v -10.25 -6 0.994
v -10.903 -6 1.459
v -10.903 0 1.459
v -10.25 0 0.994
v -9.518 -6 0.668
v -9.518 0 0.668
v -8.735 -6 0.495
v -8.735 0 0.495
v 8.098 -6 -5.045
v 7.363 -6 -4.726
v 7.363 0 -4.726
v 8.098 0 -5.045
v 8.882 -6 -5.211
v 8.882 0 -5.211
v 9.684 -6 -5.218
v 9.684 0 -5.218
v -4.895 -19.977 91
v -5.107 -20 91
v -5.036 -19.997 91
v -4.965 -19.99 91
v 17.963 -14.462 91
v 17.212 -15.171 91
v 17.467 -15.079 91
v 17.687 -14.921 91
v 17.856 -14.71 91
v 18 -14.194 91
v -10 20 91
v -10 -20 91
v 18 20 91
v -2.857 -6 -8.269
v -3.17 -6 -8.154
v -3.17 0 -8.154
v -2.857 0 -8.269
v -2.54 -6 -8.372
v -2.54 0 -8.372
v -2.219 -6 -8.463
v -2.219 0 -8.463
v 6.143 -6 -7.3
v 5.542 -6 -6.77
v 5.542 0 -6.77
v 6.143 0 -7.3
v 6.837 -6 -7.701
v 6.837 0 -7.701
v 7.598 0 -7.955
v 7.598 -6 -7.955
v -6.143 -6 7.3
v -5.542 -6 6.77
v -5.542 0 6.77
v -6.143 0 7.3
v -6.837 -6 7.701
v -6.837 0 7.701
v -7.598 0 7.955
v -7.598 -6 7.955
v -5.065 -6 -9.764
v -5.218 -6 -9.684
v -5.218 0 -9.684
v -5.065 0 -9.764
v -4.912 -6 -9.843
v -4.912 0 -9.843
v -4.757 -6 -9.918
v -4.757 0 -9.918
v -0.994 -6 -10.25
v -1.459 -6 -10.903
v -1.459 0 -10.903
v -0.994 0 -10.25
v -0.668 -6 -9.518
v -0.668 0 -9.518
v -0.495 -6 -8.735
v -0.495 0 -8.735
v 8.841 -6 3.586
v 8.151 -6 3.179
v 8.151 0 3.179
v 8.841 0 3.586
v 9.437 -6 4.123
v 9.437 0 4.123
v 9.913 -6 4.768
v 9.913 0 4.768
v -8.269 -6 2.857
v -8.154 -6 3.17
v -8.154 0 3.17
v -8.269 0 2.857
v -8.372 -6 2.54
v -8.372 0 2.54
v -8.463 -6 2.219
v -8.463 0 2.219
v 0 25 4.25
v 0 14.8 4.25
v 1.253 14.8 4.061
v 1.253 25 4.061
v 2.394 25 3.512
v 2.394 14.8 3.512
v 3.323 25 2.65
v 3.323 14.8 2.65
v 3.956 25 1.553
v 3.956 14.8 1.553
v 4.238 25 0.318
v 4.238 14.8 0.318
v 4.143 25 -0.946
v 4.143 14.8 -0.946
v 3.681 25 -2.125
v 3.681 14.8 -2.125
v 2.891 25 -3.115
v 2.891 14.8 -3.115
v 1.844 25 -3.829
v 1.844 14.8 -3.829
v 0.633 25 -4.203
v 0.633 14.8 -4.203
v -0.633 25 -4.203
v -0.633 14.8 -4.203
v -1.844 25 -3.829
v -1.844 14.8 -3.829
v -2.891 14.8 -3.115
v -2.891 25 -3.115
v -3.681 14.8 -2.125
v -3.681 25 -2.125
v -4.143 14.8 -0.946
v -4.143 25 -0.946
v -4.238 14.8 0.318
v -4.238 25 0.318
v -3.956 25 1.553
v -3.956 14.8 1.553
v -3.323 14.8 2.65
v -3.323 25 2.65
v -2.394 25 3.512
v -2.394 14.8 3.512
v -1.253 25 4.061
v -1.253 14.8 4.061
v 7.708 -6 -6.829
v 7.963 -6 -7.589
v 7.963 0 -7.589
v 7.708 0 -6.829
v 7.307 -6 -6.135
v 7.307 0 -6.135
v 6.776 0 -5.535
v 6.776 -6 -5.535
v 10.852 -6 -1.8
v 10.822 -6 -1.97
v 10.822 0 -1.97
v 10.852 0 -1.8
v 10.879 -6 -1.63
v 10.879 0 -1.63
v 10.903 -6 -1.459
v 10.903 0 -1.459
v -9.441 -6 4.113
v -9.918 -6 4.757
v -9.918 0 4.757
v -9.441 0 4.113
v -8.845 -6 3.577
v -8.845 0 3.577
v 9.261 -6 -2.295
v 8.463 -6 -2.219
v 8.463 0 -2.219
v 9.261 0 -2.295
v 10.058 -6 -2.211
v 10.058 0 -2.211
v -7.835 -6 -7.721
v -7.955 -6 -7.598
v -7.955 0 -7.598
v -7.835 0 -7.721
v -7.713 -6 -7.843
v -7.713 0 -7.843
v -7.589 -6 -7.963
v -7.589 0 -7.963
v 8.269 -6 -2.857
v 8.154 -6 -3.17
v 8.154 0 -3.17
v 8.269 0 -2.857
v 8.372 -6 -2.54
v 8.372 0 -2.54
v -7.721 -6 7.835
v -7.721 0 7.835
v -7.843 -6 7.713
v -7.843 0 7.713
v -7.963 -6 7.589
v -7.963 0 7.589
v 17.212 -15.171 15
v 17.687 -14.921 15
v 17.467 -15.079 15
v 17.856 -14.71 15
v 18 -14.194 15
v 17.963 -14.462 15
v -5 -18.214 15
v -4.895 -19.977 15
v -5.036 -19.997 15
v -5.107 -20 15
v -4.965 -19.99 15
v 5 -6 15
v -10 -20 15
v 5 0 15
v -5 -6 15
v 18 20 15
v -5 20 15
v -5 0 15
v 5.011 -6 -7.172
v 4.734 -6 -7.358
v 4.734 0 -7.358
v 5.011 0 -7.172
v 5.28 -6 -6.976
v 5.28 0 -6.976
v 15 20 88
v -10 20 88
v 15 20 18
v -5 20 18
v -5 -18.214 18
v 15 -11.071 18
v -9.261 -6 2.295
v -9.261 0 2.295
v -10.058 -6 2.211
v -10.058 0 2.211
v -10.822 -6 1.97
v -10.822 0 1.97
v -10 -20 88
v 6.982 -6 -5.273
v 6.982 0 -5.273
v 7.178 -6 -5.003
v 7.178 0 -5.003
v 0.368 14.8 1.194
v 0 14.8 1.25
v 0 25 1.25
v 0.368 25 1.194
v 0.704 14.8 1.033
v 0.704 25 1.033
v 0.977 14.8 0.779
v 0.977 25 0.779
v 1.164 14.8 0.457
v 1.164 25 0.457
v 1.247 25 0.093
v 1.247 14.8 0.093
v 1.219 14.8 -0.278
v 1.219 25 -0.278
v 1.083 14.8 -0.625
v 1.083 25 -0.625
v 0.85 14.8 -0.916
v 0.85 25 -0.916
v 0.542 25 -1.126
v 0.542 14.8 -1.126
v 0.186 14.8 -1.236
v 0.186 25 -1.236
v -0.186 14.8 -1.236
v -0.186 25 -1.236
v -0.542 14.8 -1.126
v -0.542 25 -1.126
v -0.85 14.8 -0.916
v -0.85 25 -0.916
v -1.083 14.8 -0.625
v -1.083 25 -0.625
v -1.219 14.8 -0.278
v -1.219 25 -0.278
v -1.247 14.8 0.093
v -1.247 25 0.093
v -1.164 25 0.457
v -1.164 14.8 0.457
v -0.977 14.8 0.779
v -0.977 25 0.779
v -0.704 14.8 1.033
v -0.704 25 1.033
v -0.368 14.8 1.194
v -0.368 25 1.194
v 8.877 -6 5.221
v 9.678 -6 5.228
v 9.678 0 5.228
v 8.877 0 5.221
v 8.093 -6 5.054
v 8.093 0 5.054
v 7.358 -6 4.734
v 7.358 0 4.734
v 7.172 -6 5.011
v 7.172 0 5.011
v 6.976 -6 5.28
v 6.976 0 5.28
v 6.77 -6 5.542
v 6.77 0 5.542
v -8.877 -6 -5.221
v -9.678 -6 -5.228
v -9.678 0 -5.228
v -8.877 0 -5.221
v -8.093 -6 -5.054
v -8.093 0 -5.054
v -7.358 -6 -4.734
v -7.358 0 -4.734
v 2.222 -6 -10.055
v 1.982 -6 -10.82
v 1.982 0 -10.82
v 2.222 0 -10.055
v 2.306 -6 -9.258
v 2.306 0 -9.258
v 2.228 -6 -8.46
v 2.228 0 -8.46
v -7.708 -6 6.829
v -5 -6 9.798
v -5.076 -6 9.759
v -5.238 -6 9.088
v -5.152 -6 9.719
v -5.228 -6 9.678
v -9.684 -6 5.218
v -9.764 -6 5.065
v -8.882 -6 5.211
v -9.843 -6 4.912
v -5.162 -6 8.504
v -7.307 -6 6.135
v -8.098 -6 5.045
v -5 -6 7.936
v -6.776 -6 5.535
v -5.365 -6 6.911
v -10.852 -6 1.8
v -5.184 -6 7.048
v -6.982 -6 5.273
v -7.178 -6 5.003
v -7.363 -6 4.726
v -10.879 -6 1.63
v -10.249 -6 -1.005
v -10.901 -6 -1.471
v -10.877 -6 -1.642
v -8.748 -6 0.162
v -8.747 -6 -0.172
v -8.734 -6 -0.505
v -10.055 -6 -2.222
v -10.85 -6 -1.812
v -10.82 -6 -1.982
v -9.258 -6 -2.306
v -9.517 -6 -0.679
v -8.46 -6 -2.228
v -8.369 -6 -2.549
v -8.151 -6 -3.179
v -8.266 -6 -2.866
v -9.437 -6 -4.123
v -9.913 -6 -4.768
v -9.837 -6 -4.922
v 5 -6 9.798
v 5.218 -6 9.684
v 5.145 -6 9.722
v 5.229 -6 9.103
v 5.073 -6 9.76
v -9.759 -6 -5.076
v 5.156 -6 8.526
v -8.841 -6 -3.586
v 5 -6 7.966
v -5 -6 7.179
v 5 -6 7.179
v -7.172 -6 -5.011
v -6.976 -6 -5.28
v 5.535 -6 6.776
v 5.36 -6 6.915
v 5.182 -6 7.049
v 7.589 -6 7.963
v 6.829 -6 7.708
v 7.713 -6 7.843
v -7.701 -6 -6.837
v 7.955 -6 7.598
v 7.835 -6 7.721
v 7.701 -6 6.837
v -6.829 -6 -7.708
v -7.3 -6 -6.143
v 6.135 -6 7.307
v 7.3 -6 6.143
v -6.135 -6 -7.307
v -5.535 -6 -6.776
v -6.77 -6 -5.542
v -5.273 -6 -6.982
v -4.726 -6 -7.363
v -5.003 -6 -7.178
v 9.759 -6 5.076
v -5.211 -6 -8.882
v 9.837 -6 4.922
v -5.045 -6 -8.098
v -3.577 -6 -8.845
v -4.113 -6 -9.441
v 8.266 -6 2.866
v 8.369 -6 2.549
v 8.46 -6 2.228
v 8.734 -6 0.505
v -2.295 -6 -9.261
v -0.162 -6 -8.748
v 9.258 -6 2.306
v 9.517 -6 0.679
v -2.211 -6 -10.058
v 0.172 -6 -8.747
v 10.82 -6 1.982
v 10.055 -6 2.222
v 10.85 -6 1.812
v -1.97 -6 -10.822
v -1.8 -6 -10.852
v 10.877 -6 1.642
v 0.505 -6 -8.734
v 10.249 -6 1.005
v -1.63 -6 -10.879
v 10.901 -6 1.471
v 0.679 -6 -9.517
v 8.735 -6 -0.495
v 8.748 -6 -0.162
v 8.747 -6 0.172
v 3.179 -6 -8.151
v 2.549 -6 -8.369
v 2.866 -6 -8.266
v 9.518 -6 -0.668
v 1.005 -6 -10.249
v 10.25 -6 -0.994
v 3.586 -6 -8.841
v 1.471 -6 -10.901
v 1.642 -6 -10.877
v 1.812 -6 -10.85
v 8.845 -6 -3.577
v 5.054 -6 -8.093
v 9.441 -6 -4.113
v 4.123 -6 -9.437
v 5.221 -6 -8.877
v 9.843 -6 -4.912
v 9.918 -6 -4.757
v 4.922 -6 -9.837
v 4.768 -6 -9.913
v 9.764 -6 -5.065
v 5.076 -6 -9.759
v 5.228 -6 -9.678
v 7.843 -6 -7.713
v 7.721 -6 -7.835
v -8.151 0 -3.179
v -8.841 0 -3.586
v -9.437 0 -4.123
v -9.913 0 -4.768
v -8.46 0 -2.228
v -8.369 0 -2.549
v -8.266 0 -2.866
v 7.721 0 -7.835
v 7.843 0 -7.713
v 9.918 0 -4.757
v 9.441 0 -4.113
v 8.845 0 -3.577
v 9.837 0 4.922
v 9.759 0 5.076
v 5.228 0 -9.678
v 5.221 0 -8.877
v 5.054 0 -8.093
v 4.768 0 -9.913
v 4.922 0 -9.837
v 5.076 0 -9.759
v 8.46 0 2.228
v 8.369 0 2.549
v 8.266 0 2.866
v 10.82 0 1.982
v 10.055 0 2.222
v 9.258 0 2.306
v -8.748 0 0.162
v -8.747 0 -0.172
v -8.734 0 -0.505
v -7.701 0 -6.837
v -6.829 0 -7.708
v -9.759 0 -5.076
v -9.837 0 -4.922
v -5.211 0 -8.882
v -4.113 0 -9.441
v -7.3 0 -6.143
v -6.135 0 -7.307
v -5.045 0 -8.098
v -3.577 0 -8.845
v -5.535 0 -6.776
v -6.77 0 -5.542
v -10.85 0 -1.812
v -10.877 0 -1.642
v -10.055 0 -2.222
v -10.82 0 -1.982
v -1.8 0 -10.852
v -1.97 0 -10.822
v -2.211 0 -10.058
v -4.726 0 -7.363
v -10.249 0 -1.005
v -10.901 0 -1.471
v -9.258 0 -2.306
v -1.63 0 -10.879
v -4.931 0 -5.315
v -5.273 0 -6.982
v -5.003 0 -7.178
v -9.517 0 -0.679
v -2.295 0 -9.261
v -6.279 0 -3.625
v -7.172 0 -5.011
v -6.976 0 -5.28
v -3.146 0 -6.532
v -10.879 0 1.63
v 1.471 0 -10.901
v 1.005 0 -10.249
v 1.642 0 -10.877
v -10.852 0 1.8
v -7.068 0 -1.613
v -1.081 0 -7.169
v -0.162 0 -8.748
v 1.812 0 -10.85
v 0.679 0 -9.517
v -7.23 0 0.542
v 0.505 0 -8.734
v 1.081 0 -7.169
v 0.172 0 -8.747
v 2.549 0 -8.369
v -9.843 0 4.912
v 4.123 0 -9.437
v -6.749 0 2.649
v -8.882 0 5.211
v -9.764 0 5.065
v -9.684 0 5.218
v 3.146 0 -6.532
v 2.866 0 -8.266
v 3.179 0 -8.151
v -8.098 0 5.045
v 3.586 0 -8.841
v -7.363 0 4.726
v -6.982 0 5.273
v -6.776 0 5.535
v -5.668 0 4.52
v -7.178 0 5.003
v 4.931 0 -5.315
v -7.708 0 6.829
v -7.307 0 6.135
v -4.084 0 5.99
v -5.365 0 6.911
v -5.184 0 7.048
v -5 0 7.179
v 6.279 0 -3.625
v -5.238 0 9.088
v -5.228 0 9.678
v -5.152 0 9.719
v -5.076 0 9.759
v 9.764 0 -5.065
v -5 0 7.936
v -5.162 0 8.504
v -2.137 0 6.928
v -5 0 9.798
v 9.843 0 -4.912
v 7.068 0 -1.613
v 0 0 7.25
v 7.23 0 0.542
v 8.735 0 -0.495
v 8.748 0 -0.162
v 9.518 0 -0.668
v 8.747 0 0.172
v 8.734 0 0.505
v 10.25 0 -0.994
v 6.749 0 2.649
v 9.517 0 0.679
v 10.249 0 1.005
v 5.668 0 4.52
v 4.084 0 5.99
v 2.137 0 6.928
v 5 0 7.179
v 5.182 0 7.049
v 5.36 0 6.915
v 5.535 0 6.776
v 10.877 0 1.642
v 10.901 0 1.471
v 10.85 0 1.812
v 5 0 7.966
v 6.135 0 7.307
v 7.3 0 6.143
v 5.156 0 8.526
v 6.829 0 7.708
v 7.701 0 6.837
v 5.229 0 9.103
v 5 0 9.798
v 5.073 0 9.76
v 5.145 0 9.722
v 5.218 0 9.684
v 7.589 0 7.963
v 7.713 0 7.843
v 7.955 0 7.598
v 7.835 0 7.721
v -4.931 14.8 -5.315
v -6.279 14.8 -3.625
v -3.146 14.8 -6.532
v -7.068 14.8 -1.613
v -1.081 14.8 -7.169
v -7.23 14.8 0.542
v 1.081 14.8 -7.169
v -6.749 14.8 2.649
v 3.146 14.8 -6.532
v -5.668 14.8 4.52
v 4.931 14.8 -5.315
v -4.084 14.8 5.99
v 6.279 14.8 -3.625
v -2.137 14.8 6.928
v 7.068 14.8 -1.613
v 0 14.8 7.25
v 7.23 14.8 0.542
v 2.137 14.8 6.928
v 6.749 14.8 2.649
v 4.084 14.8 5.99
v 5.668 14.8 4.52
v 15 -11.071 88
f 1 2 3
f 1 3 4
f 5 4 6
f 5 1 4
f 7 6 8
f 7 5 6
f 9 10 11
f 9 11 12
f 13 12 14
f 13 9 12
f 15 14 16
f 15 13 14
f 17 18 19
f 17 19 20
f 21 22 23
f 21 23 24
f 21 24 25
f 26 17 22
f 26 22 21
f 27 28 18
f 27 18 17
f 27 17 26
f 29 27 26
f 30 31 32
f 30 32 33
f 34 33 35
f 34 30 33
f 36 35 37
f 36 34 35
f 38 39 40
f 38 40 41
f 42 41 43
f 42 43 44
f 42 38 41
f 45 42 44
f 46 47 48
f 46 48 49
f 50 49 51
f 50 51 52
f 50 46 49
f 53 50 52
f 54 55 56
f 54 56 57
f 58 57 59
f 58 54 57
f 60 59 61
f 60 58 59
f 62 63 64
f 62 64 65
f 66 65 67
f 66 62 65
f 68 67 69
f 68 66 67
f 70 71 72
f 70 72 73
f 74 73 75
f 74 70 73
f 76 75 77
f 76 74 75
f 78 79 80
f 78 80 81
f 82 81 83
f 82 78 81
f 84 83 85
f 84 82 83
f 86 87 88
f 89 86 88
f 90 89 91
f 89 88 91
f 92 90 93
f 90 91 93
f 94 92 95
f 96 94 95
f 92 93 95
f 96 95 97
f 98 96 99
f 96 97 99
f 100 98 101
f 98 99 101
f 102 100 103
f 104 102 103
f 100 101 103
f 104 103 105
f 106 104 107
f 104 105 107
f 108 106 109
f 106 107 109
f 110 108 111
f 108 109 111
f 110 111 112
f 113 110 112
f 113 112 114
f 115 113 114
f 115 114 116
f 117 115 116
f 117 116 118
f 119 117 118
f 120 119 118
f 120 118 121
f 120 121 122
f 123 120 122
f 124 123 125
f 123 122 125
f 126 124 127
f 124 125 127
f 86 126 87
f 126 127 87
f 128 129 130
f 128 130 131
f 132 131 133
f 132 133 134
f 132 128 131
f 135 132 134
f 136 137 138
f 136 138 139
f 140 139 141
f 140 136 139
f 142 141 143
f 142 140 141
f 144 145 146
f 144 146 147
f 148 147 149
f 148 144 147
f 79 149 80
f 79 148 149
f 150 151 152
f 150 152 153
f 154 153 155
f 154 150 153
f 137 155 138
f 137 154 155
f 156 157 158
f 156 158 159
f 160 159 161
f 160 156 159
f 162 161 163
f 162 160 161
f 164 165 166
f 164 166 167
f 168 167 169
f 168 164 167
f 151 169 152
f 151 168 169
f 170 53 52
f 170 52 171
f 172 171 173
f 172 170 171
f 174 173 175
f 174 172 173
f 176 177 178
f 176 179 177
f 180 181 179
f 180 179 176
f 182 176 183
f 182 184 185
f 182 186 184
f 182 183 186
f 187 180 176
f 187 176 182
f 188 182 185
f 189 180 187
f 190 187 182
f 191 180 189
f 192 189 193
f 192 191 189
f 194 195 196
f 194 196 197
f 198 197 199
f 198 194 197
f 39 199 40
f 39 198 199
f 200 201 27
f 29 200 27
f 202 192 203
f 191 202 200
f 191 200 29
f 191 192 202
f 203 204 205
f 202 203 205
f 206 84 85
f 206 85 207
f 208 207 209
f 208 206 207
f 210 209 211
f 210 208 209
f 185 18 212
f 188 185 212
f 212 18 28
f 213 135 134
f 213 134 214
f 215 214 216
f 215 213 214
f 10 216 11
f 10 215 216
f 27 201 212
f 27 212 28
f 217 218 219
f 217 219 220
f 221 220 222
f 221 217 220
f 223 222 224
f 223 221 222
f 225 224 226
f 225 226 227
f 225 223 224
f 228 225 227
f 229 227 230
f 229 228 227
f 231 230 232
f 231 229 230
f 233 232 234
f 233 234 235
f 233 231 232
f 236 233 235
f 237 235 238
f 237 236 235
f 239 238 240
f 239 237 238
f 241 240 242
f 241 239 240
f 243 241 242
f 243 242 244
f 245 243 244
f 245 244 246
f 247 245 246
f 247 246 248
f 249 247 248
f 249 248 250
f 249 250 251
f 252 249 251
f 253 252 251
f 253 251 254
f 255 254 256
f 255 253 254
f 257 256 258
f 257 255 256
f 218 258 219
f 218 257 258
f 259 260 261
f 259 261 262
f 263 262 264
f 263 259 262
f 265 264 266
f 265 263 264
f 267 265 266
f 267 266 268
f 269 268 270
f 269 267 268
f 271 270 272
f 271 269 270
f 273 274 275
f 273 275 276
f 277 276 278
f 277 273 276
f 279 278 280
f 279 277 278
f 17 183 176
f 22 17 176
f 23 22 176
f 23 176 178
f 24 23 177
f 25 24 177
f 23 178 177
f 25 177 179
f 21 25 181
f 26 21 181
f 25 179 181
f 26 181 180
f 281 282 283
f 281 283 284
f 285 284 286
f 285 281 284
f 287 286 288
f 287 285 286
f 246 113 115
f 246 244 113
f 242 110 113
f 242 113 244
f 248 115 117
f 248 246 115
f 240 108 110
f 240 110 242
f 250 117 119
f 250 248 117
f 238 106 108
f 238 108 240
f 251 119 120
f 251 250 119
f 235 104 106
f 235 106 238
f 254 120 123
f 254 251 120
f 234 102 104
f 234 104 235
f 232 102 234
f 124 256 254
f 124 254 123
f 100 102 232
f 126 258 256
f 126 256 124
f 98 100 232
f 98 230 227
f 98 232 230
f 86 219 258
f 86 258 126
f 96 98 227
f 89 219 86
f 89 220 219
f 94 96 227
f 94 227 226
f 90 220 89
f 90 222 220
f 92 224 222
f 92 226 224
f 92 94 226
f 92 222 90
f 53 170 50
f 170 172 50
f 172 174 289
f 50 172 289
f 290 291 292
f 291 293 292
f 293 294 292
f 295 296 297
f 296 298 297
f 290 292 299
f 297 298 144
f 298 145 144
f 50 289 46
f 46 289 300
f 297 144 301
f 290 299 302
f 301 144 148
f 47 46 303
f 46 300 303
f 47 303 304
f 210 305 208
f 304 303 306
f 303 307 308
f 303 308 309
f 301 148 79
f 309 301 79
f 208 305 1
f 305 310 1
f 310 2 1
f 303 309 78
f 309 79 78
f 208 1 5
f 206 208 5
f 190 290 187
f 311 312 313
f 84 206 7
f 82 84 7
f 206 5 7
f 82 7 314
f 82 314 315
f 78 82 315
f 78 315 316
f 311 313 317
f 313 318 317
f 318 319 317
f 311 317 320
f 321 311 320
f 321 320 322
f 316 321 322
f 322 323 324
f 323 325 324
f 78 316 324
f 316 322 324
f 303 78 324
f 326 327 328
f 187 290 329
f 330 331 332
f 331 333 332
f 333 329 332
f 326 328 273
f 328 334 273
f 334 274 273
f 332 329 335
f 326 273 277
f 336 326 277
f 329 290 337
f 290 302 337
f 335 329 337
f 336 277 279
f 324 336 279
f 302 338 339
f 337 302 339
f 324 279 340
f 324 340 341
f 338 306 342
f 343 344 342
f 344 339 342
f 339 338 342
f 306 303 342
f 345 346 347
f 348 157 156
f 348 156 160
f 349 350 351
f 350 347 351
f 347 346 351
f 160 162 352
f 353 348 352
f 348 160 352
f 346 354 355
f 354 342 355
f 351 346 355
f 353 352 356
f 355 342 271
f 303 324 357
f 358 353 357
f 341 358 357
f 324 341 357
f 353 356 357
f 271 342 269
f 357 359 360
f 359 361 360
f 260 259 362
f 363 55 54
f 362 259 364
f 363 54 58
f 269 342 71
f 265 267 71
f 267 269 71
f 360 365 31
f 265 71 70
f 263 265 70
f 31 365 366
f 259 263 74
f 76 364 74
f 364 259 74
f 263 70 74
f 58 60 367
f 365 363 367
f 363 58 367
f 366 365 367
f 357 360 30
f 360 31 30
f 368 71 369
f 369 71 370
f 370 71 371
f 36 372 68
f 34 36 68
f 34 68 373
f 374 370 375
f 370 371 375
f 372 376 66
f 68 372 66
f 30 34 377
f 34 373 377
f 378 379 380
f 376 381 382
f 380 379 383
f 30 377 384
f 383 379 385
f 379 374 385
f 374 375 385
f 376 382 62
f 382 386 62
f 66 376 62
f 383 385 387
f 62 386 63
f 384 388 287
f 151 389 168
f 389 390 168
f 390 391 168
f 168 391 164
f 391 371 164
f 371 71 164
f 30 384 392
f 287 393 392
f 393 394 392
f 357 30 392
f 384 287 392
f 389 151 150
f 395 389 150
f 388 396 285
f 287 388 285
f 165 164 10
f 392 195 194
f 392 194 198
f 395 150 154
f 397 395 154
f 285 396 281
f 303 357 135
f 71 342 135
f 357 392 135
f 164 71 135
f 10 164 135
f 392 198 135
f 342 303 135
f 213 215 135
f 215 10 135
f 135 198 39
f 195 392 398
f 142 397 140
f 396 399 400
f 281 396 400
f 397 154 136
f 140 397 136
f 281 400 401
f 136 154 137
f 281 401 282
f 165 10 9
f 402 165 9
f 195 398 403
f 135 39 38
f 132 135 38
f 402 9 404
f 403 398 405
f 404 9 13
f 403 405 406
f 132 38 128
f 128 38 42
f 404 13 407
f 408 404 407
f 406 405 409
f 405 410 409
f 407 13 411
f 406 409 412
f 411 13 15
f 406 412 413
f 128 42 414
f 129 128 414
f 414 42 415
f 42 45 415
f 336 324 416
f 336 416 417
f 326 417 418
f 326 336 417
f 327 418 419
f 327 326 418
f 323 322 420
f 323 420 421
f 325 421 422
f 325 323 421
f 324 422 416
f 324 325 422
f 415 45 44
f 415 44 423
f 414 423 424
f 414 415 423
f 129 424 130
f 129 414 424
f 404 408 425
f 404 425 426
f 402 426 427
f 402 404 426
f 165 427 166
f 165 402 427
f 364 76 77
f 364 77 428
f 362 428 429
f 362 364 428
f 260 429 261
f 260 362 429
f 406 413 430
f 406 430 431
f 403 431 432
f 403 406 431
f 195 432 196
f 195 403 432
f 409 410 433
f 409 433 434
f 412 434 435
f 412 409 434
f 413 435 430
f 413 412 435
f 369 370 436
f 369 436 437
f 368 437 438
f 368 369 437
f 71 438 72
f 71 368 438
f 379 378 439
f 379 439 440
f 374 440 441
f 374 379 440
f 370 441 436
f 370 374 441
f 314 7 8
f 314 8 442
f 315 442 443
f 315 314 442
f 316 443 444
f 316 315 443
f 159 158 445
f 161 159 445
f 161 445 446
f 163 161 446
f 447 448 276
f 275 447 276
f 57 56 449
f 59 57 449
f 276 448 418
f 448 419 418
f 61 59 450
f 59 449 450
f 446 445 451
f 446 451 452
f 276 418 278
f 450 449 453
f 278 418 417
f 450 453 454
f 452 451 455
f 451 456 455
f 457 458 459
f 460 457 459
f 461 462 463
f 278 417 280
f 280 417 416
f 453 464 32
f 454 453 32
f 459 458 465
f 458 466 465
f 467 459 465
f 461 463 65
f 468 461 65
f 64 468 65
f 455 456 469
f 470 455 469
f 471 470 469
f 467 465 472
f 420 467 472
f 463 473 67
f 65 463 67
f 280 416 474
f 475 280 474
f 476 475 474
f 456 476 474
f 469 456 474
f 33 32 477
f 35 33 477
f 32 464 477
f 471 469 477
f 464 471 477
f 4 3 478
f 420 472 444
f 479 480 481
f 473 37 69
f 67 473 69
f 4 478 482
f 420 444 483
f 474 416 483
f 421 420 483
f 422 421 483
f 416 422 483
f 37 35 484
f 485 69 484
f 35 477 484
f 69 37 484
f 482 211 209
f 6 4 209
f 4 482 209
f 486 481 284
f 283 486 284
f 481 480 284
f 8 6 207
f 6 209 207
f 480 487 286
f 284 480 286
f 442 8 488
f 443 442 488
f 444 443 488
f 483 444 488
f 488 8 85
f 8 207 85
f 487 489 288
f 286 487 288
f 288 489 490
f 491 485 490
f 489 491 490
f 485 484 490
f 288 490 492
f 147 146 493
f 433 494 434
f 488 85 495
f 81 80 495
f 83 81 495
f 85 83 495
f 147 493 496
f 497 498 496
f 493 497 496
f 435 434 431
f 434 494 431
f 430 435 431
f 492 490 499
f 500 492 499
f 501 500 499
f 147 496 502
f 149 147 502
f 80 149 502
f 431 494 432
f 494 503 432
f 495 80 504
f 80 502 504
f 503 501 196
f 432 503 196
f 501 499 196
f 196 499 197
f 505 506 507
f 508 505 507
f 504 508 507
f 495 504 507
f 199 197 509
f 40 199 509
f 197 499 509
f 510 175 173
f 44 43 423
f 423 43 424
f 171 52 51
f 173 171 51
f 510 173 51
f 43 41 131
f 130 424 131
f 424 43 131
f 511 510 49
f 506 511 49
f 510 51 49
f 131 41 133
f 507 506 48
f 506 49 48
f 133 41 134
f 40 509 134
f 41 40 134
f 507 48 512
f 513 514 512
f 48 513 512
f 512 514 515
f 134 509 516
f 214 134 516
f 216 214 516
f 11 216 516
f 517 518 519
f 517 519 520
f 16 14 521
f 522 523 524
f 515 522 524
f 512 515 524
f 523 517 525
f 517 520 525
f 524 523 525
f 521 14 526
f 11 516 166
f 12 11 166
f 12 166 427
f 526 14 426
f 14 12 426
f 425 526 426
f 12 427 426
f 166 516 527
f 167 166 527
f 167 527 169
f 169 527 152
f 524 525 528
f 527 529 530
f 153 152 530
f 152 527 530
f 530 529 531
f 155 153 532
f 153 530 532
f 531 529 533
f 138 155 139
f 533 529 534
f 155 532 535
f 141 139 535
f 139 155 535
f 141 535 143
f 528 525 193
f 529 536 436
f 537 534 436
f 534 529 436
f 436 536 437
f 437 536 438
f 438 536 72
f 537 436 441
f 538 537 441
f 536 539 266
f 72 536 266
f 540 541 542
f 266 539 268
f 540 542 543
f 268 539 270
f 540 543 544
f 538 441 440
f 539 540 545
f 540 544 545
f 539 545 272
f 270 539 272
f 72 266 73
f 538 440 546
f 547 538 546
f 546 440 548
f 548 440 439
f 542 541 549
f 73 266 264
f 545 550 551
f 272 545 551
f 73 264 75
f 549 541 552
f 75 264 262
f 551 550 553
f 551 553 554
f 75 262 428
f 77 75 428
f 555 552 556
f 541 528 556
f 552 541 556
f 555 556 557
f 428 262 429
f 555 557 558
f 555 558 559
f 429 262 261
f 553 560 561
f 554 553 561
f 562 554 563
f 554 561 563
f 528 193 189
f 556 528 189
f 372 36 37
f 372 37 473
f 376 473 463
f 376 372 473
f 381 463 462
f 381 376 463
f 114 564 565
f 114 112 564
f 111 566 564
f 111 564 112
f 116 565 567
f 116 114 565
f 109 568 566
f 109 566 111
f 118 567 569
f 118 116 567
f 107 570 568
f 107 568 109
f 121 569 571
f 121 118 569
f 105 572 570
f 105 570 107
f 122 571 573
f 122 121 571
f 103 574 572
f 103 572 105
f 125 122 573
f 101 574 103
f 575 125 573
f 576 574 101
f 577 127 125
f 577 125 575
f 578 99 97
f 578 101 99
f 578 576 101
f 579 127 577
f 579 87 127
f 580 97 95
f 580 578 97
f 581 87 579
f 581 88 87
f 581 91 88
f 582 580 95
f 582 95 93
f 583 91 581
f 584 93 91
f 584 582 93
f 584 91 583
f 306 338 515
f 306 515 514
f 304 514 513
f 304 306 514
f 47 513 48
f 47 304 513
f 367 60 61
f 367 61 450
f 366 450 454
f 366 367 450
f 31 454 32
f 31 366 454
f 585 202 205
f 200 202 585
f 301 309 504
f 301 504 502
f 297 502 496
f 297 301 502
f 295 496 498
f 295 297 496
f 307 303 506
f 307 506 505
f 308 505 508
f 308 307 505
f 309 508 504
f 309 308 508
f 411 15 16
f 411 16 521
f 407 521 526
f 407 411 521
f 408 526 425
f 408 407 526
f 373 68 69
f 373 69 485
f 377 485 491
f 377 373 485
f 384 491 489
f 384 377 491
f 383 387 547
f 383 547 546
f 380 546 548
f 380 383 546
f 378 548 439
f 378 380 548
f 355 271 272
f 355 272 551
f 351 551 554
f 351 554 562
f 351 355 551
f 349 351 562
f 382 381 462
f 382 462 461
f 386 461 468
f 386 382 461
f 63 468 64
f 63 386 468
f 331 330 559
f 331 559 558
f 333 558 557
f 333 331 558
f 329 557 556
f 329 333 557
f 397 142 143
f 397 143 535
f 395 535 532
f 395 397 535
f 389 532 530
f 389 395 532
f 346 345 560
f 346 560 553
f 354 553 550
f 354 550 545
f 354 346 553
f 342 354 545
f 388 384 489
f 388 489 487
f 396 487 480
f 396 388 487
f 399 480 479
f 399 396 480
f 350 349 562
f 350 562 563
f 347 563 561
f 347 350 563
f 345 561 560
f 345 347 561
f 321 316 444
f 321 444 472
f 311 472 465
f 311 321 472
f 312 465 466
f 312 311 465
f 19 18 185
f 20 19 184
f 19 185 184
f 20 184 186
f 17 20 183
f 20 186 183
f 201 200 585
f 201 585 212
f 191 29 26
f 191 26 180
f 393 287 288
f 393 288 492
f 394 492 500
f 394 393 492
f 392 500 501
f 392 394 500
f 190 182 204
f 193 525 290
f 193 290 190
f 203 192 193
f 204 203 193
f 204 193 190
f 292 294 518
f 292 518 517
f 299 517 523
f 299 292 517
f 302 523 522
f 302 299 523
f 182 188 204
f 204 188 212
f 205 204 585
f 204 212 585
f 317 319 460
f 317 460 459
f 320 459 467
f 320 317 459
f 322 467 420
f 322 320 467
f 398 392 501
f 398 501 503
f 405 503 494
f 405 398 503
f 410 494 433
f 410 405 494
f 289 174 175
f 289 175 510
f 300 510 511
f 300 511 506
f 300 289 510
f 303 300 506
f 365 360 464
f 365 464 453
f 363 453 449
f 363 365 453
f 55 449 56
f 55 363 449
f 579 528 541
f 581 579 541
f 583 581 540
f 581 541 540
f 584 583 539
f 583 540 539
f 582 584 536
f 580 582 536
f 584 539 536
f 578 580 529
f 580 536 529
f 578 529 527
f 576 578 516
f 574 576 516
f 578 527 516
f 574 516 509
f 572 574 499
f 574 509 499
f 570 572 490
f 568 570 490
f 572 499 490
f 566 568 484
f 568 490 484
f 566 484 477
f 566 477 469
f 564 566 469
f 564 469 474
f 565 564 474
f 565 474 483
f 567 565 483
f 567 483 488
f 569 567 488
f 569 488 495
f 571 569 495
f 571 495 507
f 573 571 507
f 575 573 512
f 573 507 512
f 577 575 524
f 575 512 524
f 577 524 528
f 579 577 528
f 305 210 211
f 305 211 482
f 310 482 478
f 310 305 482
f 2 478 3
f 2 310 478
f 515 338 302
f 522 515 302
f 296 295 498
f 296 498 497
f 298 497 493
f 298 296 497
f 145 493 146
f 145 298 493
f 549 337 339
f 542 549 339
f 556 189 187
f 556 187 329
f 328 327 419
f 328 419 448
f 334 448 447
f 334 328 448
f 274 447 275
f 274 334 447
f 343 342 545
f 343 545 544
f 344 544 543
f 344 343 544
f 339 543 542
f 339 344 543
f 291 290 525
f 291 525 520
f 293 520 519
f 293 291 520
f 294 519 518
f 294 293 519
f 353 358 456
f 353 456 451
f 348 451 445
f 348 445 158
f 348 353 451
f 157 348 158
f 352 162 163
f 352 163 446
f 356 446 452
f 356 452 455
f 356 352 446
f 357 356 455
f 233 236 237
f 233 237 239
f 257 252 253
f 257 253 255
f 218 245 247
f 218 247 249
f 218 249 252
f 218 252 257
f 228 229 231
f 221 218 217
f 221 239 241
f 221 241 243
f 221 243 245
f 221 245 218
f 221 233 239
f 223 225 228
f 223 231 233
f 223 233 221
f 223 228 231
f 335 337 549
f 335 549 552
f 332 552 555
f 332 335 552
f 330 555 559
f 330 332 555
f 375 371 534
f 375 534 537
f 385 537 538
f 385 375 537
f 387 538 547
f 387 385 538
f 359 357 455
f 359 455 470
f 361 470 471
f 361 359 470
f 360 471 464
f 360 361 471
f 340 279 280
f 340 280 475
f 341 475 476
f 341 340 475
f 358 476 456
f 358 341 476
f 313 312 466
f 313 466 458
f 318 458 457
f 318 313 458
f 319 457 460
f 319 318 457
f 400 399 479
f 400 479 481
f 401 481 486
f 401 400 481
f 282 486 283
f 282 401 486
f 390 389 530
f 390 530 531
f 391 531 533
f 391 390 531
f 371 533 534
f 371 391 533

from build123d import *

# Parameters (mm, degrees)
EXTRUDE_1_DEPTH     = 6
EXTRUDE_2_DEPTH     = 20
EXTRUDE_4_DEPTH     = 6
SKETCH_5_R          = 7.25
EXTRUDE_5_DEPTH     = 14.8
SKETCH_6_R          = 4.25
SKETCH_6_R_2        = 1.25
EXTRUDE_6_DEPTH     = 10.2
EXTRUDE_7_DEPTH     = 76
CUT_EXTRUDE_1_DEPTH = 76


with BuildPart() as part:
    # 草图1 → 凸台-拉伸1 (new body)
    with BuildSketch(Plane(origin=(0, 0, 0), x_dir=(1, 0, 0), z_dir=(0, 1, 0))):
        with BuildLine():
            Line((-5, 0), (-5, -18))
            Line((-5, -18), (15, -18))
            Line((15, -18), (15, -88))
            Line((15, -88), (-10, -88))
            Line((-10, -88), (-10, -91))
            Line((-10, -91), (18, -91))
            Line((18, -91), (18, -15))
            Line((18, -15), (5, -15))
            Line((5, -15), (5, 0))
            ThreePointArc((5, 0), (0, 5), (-5, 0))
        make_face()
    extrude(amount=-EXTRUDE_1_DEPTH)

    # 草图2 → 凸台-拉伸2 (add, symmetric)
    with BuildSketch(Plane(origin=(0, 0, 0), x_dir=(1, 0, 0), z_dir=(0, 1, 0))):
        Polygon((-5, -18), (15, -18), (15, -88), (-10, -88), (-10, -91), (18, -91), (18, -15), (-5, -15), align=None)
    extrude(amount=EXTRUDE_2_DEPTH, both=True)

    # 草图4 → 凸台-拉伸4 (add)
    with BuildSketch(Plane.XZ.offset(6)):
        with BuildLine():
            ThreePointArc((-0.504732798, 8.734428762), (-0.823506466, 9.891100464), (-1.470958285, 10.901205517))
            ThreePointArc((-1.470958285, 10.901205517), (-1.726760313, 10.86362273), (-1.981608382, 10.820038273))
            ThreePointArc((-1.981608382, 10.820038273), (-2.283953757, 9.65896405), (-2.228374617, 8.460457882))
            ThreePointArc((-2.228374617, 8.460457882), (-2.708170263, 8.319303747), (-3.17911634, 8.150964378))
            ThreePointArc((-3.17911634, 8.150964378), (-3.839719327, 9.152518056), (-4.767622226, 9.913111434))
            ThreePointArc((-4.767622226, 9.913111434), (-4.999290692, 9.798320906), (-5.228197271, 9.678117239))
            ThreePointArc((-5.228197271, 9.678117239), (-5.156953143, 8.480440175), (-4.733735466, 7.357767973))
            ThreePointArc((-4.733735466, 7.357767973), (-5.146429214, 7.075257405), (-5.542305825, 6.76962681))
            ThreePointArc((-5.542305825, 6.76962681), (-6.480073708, 7.518023412), (-7.597598086, 7.954652936))
            ThreePointArc((-7.597598086, 7.954652936), (-7.782455665, 7.773891163), (-7.963013783, 7.588834659))
            ThreePointArc((-7.963013783, 7.588834659), (-7.525154025, 6.471791729), (-6.775725305, 5.53484847))
            ThreePointArc((-6.775725305, 5.53484847), (-7.080919818, 5.138635571), (-7.3629758, 4.725631002))
            ThreePointArc((-7.3629758, 4.725631002), (-8.486113324, 5.147612255), (-9.683868109, 5.217537585))
            ThreePointArc((-9.683868109, 5.217537585), (-9.803819655, 4.988498789), (-9.918355025, 4.756704069))
            ThreePointArc((-9.918355025, 4.756704069), (-9.1567404, 3.829639217), (-8.154459943, 3.170139435))
            ThreePointArc((-8.154459943, 3.170139435), (-8.322280653, 2.699008286), (-8.462906403, 2.219057507))
            ThreePointArc((-8.462906403, 2.219057507), (-9.661473042, 2.273316945), (-10.82221365, 1.969693302))
            ThreePointArc((-10.82221365, 1.969693302), (-10.86551747, 1.714797397), (-10.902818572, 1.458954141))
            ThreePointArc((-10.902818572, 1.458954141), (-9.892001226, 0.812614936), (-8.734979226, 0.495115065))
            ThreePointArc((-8.734979226, 0.495115065), (-8.748998674, -0.004816736), (-8.734428762, -0.504732798))
            ThreePointArc((-8.734428762, -0.504732798), (-9.891100464, -0.823506466), (-10.901205517, -1.470958285))
            ThreePointArc((-10.901205517, -1.470958285), (-10.86362273, -1.726760313), (-10.820038273, -1.981608382))
            ThreePointArc((-10.820038273, -1.981608382), (-9.65896405, -2.283953757), (-8.460457882, -2.228374617))
            ThreePointArc((-8.460457882, -2.228374617), (-8.319303747, -2.708170263), (-8.150964378, -3.17911634))
            ThreePointArc((-8.150964378, -3.17911634), (-9.152518056, -3.839719327), (-9.913111434, -4.767622226))
            ThreePointArc((-9.913111434, -4.767622226), (-9.798320906, -4.999290692), (-9.678117239, -5.228197271))
            ThreePointArc((-9.678117239, -5.228197271), (-8.480440175, -5.156953143), (-7.357767973, -4.733735466))
            ThreePointArc((-7.357767973, -4.733735466), (-7.075257405, -5.146429214), (-6.76962681, -5.542305825))
            ThreePointArc((-6.76962681, -5.542305825), (-7.518023412, -6.480073708), (-7.954652936, -7.597598086))
            ThreePointArc((-7.954652936, -7.597598086), (-7.773891163, -7.782455665), (-7.588834659, -7.963013783))
            ThreePointArc((-7.588834659, -7.963013783), (-6.471791729, -7.525154025), (-5.53484847, -6.775725305))
            ThreePointArc((-5.53484847, -6.775725305), (-5.138635571, -7.080919818), (-4.725631002, -7.3629758))
            ThreePointArc((-4.725631002, -7.3629758), (-5.147612255, -8.486113324), (-5.217537585, -9.683868109))
            ThreePointArc((-5.217537585, -9.683868109), (-4.988498789, -9.803819655), (-4.756704069, -9.918355025))
            ThreePointArc((-4.756704069, -9.918355025), (-3.829639217, -9.1567404), (-3.170139435, -8.154459943))
            ThreePointArc((-3.170139435, -8.154459943), (-2.699008286, -8.322280653), (-2.219057507, -8.462906403))
            ThreePointArc((-2.219057507, -8.462906403), (-2.273316945, -9.661473042), (-1.969693302, -10.82221365))
            ThreePointArc((-1.969693302, -10.82221365), (-1.714797397, -10.86551747), (-1.458954141, -10.902818572))
            ThreePointArc((-1.458954141, -10.902818572), (-0.812614936, -9.892001226), (-0.495115065, -8.734979226))
            ThreePointArc((-0.495115065, -8.734979226), (0.004816736, -8.748998674), (0.504732798, -8.734428762))
            ThreePointArc((0.504732798, -8.734428762), (0.823506466, -9.891100464), (1.470958285, -10.901205517))
            ThreePointArc((1.470958285, -10.901205517), (1.726760313, -10.86362273), (1.981608382, -10.820038273))
            ThreePointArc((1.981608382, -10.820038273), (2.283953757, -9.65896405), (2.228374617, -8.460457882))
            ThreePointArc((2.228374617, -8.460457882), (2.708170263, -8.319303747), (3.17911634, -8.150964378))
            ThreePointArc((3.17911634, -8.150964378), (3.839719327, -9.152518056), (4.767622226, -9.913111434))
            ThreePointArc((4.767622226, -9.913111434), (4.999290692, -9.798320906), (5.228197271, -9.678117239))
            ThreePointArc((5.228197271, -9.678117239), (5.156953143, -8.480440175), (4.733735466, -7.357767973))
            ThreePointArc((4.733735466, -7.357767973), (5.146429214, -7.075257405), (5.542305825, -6.76962681))
            ThreePointArc((5.542305825, -6.76962681), (6.480073708, -7.518023412), (7.597598086, -7.954652936))
            ThreePointArc((7.597598086, -7.954652936), (7.782455665, -7.773891163), (7.963013783, -7.588834659))
            ThreePointArc((7.963013783, -7.588834659), (7.525154025, -6.471791729), (6.775725305, -5.53484847))
            ThreePointArc((6.775725305, -5.53484847), (7.080919818, -5.138635571), (7.3629758, -4.725631002))
            ThreePointArc((7.3629758, -4.725631002), (8.486113324, -5.147612255), (9.683868109, -5.217537585))
            ThreePointArc((9.683868109, -5.217537585), (9.803819655, -4.988498789), (9.918355025, -4.756704069))
            ThreePointArc((9.918355025, -4.756704069), (9.1567404, -3.829639217), (8.154459943, -3.170139435))
            ThreePointArc((8.154459943, -3.170139435), (8.322280653, -2.699008286), (8.462906403, -2.219057507))
            ThreePointArc((8.462906403, -2.219057507), (9.661473042, -2.273316945), (10.82221365, -1.969693302))
            ThreePointArc((10.82221365, -1.969693302), (10.86551747, -1.714797397), (10.902818572, -1.458954141))
            ThreePointArc((10.902818572, -1.458954141), (9.892001226, -0.812614936), (8.734979226, -0.495115065))
            ThreePointArc((8.734979226, -0.495115065), (8.748998674, 0.004816736), (8.734428762, 0.504732798))
            ThreePointArc((8.734428762, 0.504732798), (9.891100464, 0.823506466), (10.901205517, 1.470958285))
            ThreePointArc((10.901205517, 1.470958285), (10.86362273, 1.726760313), (10.820038273, 1.981608382))
            ThreePointArc((10.820038273, 1.981608382), (9.65896405, 2.283953757), (8.460457882, 2.228374617))
            ThreePointArc((8.460457882, 2.228374617), (8.319303747, 2.708170263), (8.150964378, 3.17911634))
            ThreePointArc((8.150964378, 3.17911634), (9.152518056, 3.839719327), (9.913111434, 4.767622226))
            ThreePointArc((9.913111434, 4.767622226), (9.798320906, 4.999290692), (9.678117239, 5.228197271))
            ThreePointArc((9.678117239, 5.228197271), (8.480440175, 5.156953143), (7.357767973, 4.733735466))
            ThreePointArc((7.357767973, 4.733735466), (7.075257405, 5.146429214), (6.76962681, 5.542305825))
            ThreePointArc((6.76962681, 5.542305825), (7.518023412, 6.480073708), (7.954652936, 7.597598086))
            ThreePointArc((7.954652936, 7.597598086), (7.773891163, 7.782455665), (7.588834659, 7.963013783))
            ThreePointArc((7.588834659, 7.963013783), (6.471791729, 7.525154025), (5.53484847, 6.775725305))
            ThreePointArc((5.53484847, 6.775725305), (5.138635571, 7.080919818), (4.725631002, 7.3629758))
            ThreePointArc((4.725631002, 7.3629758), (5.147612255, 8.486113324), (5.217537585, 9.683868109))
            ThreePointArc((5.217537585, 9.683868109), (4.988498789, 9.803819655), (4.756704069, 9.918355025))
            ThreePointArc((4.756704069, 9.918355025), (3.829639217, 9.1567404), (3.170139435, 8.154459943))
            ThreePointArc((3.170139435, 8.154459943), (2.699008286, 8.322280653), (2.219057507, 8.462906403))
            ThreePointArc((2.219057507, 8.462906403), (2.273316945, 9.661473042), (1.969693302, 10.82221365))
            ThreePointArc((1.969693302, 10.82221365), (1.714797397, 10.86551747), (1.458954141, 10.902818572))
            ThreePointArc((1.458954141, 10.902818572), (0.812614936, 9.892001226), (0.495115065, 8.734979226))
            ThreePointArc((0.495115065, 8.734979226), (-0.004816736, 8.748998674), (-0.504732798, 8.734428762))
        make_face()
    extrude(amount=-EXTRUDE_4_DEPTH)

    # 草图5 → 凸台-拉伸5 (add)
    with BuildSketch(Plane(origin=(0, 0, 0), x_dir=(1, 0, 0), z_dir=(0, 1, 0))):
        with Locations(Location((0, 0, 0), (0, 0, 270))):
            Circle(SKETCH_5_R)
    extrude(amount=EXTRUDE_5_DEPTH)

    # 草图6 → 凸台-拉伸6 (add)
    with BuildSketch(Plane(origin=(0, 14.8, 0), x_dir=(1, 0, 0), z_dir=(0, 1, 0))):
        with Locations(Location((0, 0, 0), (0, 0, 270))):
            Circle(SKETCH_6_R)
        with Locations(Location((0, 0, 0), (0, 0, 270))):
            Circle(SKETCH_6_R_2, mode=Mode.SUBTRACT)
    extrude(amount=EXTRUDE_6_DEPTH)

    # 草图8 → 凸台-拉伸7 (add)
    with BuildSketch(Plane.XY.offset(91)):
        Polygon((-10, -20), (18, -10), (18, -20), align=None)
    extrude(amount=-EXTRUDE_7_DEPTH)

    # 草图9 → 切除-拉伸1 (cut)
    with BuildSketch(Plane(origin=(0, 0, 15), x_dir=(-1, 0, 0), z_dir=(0, 0, -1))):
        with BuildLine():
            Line((4.895011274, -19.977176364), (-17.212429644, -15.171210947))
            ThreePointArc((-17.212429644, -15.171210947), (-17.778597985, -14.821557633), (-18, -14.194034583))
            Line((-18, -14.194034583), (-18, -20))
            Line((-18, -20), (5.107440918, -20))
            ThreePointArc((5.107440918, -20), (5.000614807, -19.994277719), (4.895011274, -19.977176364))
        make_face()
    extrude(amount=-CUT_EXTRUDE_1_DEPTH, mode=Mode.SUBTRACT)


solid = part.part
